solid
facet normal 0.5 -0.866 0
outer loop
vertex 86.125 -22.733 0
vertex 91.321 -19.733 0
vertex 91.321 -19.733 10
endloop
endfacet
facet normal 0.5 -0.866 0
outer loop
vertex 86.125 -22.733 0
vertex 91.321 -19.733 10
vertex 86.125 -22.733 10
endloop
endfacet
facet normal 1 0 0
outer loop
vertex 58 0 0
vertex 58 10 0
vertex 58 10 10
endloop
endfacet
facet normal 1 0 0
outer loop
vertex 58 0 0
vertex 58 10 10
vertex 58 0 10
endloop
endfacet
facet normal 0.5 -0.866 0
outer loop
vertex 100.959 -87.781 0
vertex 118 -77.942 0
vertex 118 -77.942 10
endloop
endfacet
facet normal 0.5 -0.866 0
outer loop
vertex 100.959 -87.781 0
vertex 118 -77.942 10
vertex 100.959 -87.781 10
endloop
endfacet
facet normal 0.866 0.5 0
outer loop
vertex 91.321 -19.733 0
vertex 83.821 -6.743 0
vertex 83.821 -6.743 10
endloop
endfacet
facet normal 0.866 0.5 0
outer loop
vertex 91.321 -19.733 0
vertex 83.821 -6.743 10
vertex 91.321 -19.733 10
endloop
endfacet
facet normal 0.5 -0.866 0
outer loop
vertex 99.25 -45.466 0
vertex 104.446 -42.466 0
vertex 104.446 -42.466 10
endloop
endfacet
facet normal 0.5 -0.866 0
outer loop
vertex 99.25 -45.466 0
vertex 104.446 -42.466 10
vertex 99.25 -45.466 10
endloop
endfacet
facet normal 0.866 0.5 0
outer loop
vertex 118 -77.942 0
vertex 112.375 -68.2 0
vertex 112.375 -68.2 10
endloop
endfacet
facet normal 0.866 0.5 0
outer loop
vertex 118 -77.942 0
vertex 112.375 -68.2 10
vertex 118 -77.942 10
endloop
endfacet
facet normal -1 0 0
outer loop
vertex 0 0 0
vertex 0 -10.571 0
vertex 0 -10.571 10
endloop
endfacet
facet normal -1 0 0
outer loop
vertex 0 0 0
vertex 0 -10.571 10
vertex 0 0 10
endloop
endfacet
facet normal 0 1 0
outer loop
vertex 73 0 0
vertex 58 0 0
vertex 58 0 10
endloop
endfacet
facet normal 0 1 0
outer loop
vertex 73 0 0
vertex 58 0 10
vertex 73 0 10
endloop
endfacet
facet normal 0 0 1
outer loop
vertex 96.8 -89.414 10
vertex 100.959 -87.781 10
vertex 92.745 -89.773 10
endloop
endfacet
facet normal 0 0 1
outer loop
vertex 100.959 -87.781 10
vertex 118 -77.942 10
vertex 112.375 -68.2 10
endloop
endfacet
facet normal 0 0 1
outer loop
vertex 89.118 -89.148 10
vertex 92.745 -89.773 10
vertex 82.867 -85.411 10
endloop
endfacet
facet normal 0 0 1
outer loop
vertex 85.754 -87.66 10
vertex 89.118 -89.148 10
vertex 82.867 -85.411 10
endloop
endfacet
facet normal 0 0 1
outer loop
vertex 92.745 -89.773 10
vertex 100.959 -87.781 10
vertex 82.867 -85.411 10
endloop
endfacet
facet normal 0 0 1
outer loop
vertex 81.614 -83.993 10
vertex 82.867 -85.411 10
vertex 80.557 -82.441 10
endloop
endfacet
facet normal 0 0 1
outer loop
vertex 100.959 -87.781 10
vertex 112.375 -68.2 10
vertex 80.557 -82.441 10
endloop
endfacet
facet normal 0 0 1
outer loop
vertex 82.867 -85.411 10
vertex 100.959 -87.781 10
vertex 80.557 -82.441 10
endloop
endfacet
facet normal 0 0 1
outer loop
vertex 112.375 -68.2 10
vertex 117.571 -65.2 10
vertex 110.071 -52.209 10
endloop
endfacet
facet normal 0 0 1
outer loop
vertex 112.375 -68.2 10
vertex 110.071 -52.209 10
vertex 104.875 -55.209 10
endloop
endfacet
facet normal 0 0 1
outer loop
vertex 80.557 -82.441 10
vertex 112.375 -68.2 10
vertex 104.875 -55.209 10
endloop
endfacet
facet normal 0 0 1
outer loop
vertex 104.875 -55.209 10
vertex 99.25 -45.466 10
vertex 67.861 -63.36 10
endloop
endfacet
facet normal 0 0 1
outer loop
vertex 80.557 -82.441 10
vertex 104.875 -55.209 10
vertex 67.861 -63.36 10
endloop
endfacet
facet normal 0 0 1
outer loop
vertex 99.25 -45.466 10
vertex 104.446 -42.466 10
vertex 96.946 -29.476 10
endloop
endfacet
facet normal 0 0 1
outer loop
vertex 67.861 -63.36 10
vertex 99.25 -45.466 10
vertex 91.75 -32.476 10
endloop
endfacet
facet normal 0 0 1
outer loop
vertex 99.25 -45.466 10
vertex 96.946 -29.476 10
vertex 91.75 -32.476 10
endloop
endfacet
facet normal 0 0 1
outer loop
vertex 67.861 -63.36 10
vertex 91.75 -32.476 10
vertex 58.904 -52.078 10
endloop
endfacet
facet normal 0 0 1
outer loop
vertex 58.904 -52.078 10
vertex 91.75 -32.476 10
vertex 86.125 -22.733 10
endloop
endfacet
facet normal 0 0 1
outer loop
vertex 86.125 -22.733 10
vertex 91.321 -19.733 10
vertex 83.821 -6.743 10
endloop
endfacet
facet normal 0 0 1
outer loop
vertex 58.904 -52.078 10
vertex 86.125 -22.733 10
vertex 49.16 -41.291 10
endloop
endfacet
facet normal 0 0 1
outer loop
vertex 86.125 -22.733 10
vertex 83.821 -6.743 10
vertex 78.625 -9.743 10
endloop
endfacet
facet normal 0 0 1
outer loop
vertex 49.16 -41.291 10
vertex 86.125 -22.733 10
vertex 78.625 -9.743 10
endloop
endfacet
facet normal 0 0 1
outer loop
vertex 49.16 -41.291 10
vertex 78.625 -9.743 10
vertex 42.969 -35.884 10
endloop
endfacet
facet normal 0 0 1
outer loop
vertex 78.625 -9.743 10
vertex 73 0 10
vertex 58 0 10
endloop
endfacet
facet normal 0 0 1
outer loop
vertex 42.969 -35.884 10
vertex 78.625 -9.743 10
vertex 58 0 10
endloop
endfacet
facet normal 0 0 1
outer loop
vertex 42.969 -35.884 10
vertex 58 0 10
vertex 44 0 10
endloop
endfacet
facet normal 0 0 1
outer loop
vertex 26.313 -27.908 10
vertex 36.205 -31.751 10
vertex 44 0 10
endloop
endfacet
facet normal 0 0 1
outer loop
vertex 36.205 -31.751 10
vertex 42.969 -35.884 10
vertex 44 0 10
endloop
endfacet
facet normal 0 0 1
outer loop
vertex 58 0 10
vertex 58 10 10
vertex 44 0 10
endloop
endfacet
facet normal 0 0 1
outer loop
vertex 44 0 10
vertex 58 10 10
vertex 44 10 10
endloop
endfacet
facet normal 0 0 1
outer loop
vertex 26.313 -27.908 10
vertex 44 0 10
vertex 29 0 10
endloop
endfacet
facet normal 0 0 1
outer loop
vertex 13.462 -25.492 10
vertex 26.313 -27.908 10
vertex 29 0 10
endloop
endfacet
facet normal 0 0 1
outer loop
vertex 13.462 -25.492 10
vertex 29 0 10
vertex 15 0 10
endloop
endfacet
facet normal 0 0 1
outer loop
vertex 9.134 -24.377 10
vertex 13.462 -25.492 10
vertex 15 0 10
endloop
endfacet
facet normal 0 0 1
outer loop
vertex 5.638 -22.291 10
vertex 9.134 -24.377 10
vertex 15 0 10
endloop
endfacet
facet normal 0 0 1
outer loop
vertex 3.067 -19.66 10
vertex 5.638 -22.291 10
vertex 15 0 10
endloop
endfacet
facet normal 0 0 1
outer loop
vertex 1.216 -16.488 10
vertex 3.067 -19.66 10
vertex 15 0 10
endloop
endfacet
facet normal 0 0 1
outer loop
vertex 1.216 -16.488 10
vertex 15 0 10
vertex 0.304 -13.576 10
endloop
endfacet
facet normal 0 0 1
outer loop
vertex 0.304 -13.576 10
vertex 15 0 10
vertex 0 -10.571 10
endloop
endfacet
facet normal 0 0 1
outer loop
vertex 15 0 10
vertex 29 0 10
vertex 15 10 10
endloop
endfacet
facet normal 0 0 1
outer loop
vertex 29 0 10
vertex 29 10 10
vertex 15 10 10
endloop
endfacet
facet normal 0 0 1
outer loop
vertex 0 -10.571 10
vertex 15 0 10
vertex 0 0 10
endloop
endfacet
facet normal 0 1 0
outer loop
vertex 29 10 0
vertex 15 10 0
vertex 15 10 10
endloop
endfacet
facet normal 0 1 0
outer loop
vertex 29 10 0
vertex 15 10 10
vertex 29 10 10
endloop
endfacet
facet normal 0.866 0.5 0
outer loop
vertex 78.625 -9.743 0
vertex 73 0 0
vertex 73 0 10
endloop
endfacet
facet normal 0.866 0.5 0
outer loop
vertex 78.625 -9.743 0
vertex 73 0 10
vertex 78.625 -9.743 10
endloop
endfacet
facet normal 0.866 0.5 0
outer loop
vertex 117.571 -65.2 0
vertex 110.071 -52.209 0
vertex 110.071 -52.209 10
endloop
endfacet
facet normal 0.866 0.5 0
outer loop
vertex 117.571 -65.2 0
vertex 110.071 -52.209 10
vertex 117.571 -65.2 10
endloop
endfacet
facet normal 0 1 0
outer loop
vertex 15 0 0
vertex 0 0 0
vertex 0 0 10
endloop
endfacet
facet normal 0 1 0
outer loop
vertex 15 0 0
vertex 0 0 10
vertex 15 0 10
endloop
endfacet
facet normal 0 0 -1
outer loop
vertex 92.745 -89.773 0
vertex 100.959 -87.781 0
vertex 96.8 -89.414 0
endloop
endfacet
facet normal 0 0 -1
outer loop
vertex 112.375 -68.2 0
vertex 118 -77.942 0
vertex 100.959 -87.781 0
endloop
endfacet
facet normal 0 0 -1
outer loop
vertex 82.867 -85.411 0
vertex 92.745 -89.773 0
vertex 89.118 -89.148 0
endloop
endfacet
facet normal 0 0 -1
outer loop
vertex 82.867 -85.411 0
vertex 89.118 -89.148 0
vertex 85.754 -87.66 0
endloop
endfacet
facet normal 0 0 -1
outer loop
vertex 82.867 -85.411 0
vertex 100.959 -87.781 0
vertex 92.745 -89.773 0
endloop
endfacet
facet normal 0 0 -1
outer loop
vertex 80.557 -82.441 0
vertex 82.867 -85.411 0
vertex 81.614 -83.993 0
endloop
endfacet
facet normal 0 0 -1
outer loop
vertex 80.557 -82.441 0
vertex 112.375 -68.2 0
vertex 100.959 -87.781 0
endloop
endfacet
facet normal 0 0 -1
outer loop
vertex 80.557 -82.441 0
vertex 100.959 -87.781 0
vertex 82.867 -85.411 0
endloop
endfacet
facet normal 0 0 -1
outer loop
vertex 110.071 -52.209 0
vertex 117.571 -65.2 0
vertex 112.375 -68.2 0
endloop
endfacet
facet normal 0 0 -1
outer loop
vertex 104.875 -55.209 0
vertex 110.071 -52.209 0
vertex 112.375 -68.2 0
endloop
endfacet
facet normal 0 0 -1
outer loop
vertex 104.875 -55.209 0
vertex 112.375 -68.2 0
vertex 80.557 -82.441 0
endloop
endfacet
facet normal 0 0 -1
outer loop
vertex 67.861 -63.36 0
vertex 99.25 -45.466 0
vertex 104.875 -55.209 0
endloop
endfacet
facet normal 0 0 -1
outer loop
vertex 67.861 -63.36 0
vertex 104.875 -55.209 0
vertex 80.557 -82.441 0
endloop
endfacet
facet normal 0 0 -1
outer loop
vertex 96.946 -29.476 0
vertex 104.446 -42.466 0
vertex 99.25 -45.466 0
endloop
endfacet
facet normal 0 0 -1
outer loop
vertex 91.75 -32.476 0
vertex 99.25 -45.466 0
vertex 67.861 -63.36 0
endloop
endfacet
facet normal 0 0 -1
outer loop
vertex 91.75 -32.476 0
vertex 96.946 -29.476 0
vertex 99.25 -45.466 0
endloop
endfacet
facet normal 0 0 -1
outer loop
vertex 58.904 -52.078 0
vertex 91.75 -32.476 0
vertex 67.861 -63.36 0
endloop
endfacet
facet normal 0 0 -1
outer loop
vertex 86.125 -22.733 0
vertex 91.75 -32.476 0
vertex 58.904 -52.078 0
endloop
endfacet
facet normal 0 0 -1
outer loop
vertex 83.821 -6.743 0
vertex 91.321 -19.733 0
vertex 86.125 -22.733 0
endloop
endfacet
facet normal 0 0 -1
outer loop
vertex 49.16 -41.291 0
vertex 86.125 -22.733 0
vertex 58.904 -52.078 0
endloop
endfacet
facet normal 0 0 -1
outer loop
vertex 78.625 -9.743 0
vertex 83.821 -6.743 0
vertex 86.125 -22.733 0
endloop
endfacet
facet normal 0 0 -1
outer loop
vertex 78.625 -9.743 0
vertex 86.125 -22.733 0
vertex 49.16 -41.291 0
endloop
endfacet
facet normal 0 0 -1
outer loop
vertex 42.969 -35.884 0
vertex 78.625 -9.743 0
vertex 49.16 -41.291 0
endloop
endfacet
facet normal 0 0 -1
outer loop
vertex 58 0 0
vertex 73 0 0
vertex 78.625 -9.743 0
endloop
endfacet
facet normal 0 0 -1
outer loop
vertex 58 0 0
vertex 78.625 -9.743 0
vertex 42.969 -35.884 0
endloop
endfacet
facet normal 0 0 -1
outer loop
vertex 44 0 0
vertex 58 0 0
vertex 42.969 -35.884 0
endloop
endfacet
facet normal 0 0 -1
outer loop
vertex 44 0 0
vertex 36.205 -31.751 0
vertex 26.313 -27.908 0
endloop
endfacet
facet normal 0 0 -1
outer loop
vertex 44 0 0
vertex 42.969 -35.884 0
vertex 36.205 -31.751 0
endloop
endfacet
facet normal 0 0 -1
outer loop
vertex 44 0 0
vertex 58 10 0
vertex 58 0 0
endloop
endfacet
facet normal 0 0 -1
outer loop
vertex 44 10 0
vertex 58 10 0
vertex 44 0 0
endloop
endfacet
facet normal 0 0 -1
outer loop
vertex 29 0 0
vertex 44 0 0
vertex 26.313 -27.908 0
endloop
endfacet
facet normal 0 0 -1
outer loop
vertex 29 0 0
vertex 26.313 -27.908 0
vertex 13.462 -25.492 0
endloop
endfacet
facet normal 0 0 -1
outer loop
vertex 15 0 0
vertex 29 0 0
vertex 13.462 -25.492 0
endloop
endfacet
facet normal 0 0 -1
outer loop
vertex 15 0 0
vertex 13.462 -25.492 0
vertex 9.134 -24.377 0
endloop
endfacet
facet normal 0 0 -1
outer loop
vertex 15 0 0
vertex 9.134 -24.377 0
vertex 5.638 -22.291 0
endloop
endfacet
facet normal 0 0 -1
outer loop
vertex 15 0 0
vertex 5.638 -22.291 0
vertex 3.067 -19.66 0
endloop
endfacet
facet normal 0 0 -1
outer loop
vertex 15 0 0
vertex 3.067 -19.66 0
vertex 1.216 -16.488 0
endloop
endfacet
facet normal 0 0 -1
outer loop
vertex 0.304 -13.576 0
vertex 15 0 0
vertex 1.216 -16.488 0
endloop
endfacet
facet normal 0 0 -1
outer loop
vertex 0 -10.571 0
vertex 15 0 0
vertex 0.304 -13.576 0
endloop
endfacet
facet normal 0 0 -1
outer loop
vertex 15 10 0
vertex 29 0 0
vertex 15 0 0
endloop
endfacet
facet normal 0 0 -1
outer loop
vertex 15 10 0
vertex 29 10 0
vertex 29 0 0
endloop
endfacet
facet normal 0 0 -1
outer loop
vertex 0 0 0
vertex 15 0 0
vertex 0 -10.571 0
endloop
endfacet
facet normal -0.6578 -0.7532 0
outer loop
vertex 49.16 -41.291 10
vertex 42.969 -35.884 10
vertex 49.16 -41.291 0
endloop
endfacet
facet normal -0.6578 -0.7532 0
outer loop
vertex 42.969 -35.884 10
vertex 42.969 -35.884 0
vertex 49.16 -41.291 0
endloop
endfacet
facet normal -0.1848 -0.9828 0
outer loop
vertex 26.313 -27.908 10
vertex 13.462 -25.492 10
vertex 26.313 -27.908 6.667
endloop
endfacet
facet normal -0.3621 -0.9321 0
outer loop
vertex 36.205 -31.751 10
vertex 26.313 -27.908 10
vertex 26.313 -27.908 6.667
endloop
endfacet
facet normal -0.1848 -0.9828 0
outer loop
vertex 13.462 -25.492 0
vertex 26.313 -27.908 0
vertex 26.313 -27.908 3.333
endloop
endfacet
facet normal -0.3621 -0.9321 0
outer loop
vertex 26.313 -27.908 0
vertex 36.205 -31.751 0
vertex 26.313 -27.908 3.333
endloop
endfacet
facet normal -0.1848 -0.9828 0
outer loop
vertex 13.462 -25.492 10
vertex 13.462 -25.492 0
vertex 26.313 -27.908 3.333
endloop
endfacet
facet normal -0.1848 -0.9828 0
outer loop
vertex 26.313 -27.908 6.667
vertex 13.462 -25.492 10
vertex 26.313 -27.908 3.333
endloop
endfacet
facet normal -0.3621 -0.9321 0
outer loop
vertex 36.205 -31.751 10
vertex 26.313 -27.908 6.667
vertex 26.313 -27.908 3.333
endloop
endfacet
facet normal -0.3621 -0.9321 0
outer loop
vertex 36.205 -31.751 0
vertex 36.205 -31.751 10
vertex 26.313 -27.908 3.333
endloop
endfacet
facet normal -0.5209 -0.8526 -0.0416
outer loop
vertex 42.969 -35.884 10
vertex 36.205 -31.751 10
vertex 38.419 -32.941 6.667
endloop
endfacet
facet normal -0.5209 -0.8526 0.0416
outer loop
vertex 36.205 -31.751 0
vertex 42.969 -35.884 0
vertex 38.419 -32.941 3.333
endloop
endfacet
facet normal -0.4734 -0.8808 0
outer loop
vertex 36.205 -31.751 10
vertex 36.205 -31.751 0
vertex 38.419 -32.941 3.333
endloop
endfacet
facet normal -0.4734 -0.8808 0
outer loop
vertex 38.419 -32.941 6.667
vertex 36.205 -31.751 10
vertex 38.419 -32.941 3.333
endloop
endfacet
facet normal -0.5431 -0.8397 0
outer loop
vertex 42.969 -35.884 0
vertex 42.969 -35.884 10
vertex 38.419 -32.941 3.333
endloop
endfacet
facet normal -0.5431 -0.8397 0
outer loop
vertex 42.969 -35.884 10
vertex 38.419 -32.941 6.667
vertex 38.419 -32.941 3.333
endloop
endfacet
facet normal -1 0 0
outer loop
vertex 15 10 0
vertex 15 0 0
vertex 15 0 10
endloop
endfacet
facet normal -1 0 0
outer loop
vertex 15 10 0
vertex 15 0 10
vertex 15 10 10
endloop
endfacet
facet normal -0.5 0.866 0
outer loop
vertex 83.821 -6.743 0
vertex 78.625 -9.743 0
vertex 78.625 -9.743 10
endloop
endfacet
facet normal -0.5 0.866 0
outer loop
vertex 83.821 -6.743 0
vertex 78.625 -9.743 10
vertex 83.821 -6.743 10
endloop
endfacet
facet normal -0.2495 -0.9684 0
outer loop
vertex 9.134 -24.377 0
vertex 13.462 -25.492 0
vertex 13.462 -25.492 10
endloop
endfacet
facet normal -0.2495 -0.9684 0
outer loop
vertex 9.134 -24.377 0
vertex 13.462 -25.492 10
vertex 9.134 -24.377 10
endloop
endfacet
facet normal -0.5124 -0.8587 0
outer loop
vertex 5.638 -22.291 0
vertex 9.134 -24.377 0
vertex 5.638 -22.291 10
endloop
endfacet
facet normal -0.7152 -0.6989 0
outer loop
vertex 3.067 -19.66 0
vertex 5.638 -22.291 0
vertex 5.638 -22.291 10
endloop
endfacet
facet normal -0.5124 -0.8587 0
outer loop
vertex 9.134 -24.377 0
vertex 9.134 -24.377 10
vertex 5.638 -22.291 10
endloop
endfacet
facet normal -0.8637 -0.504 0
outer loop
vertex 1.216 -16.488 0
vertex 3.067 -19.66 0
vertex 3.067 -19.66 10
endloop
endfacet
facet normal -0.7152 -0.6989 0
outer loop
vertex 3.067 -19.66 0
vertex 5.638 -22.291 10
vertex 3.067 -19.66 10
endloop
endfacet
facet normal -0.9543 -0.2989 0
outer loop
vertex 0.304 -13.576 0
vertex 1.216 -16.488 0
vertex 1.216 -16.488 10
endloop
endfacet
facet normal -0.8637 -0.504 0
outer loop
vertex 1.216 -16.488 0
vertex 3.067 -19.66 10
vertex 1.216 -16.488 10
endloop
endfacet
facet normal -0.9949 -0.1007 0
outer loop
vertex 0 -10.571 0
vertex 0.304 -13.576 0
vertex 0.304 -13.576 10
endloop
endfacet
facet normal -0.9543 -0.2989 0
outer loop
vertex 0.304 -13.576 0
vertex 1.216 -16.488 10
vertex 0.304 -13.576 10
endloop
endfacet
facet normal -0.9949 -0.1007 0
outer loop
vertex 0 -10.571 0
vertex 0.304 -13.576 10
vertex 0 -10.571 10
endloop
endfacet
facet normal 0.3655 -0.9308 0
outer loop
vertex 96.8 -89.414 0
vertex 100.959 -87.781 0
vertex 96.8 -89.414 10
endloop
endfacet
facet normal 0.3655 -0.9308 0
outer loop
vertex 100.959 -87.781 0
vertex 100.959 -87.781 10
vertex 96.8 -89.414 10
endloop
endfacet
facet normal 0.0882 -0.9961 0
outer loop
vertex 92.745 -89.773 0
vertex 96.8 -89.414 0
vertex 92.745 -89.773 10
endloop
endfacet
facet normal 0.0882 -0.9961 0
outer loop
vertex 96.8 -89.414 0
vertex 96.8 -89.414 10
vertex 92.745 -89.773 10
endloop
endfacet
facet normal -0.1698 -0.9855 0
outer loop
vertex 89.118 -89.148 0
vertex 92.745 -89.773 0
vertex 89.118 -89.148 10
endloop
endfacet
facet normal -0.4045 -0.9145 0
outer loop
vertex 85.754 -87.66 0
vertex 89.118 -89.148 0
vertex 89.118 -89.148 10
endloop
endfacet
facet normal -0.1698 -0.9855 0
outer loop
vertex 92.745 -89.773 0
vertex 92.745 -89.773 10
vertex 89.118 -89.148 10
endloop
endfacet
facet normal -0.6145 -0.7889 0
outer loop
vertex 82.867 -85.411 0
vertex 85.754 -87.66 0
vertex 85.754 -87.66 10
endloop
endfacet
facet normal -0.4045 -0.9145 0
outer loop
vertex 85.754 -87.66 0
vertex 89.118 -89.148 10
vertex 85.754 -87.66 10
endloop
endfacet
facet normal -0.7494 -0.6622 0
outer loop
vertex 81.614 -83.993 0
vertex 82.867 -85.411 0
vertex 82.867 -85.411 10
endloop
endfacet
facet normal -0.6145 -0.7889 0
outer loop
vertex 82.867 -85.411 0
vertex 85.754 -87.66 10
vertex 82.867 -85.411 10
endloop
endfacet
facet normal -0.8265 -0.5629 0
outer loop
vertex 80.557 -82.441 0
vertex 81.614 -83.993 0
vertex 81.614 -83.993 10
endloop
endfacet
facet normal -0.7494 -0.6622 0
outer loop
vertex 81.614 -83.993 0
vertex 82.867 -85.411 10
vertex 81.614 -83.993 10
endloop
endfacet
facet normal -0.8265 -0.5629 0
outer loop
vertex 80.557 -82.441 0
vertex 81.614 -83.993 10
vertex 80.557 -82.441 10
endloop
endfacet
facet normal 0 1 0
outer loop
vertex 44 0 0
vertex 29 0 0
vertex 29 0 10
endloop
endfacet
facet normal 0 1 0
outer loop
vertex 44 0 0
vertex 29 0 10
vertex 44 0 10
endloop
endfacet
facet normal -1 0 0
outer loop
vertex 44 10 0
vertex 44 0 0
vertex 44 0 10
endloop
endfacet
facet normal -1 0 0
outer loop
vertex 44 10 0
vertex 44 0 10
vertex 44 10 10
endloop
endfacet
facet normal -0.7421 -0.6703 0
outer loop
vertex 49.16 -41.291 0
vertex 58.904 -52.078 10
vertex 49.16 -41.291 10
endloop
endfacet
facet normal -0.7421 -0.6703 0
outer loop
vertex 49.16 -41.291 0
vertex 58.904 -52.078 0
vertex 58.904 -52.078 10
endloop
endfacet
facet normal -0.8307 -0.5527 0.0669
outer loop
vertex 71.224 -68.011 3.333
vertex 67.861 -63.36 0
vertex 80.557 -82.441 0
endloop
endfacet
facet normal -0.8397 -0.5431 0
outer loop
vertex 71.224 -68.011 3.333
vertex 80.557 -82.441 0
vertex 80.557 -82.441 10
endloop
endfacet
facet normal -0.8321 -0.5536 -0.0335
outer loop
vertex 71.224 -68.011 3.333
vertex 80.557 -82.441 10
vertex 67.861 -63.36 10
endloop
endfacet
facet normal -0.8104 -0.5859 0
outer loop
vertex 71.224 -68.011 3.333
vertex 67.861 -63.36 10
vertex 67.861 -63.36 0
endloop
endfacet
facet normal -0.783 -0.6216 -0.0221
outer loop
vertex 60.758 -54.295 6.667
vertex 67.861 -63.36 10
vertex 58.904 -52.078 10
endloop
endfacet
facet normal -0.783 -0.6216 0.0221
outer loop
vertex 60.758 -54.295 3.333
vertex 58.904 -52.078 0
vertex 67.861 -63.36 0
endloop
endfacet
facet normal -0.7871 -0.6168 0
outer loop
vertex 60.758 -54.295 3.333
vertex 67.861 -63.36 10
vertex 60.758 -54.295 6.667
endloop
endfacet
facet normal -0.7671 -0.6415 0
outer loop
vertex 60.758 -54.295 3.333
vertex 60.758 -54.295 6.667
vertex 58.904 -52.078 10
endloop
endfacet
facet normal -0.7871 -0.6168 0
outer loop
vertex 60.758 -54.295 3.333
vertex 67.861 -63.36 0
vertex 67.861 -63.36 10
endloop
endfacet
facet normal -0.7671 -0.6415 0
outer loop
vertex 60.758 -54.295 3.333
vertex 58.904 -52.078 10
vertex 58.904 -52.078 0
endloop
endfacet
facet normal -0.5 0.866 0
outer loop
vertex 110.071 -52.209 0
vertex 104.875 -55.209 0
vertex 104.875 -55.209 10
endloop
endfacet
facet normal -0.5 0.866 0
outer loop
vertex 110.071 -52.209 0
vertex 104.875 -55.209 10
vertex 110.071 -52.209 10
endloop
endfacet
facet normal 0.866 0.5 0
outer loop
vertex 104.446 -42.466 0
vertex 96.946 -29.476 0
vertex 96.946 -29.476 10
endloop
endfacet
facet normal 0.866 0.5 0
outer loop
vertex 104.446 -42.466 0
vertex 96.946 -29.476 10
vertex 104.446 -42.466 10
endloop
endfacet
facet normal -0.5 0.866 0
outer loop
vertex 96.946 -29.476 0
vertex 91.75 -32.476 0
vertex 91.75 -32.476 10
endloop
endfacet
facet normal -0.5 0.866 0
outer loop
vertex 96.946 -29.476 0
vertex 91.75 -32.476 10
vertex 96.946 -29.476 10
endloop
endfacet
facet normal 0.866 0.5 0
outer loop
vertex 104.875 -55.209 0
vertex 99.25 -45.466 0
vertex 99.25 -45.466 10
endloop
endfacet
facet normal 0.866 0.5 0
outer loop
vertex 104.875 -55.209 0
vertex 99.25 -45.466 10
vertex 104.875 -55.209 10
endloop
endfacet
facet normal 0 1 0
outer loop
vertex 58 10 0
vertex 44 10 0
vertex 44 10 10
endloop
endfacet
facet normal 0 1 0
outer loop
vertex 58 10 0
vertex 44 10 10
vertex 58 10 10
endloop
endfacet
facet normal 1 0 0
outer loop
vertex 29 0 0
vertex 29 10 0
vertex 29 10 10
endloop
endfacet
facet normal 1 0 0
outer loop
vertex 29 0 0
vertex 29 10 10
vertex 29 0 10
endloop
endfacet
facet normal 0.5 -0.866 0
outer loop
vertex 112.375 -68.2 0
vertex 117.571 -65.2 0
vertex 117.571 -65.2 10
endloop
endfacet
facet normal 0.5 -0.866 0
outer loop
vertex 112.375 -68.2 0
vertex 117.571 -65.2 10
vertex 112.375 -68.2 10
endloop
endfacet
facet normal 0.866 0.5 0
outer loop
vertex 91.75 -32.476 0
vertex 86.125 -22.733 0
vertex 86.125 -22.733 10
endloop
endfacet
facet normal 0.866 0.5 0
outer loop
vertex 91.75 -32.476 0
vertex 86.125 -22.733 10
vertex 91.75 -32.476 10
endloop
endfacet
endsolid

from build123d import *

# Parameters (mm, degrees)
BOSS_EXTRUDE1_DEPTH = 10
FILLET1_R           = 15


with BuildPart() as part:
    # Sketch1 → Boss-Extrude1 (new body)
    with BuildSketch(Plane.XY):
        with BuildLine():
            Line((0, 0), (15, 0))
            Line((15, 0), (15, 10))
            Line((15, 10), (29, 10))
            Line((29, 10), (29, 0))
            Line((29, 0), (44, 0))
            Line((44, 0), (44, 10))
            Line((44, 10), (58, 10))
            Line((58, 10), (58, 0))
            Line((58, 0), (73, 0))
            Line((73, 0), (78.625, -9.742785793))
            Line((78.625, -9.742785793), (83.821152423, -6.742785793))
            Line((83.821152423, -6.742785793), (91.321152423, -19.733166849))
            Line((91.321152423, -19.733166849), (86.125, -22.733166849))
            Line((86.125, -22.733166849), (91.75, -32.475952642))
            Line((91.75, -32.475952642), (96.946152423, -29.475952642))
            Line((96.946152423, -29.475952642), (104.446152423, -42.466333699))
            Line((104.446152423, -42.466333699), (99.25, -45.466333699))
            Line((99.25, -45.466333699), (104.875, -55.209119491))
            Line((104.875, -55.209119491), (110.071152423, -52.209119491))
            Line((110.071152423, -52.209119491), (117.571152423, -65.199500548))
            Line((117.571152423, -65.199500548), (112.375, -68.199500548))
            Line((112.375, -68.199500548), (118, -77.942286341))
            Line((118, -77.942286341), (87.689110868, -95.442286341))
            add(Edge.make_bspline(
                [(87.689110868, -95.442286341), (77.660181341, -75.620017272), (64.817303381, -57.569676854), (49.160476986, -41.291265088)],
                knots=[0, 0, 0, 0, 1, 1, 1, 1], degree=3))
            add(Edge.make_bspline(
                [(0, -25), (17.242534467, -24.639573707), (35.899987596, -27.504326339), (49.160476986, -41.291265088)],
                knots=[0, 0, 0, 0, 1, 1, 1, 1], degree=3))
            Line((0, -25), (0, 0))
        make_face()
    extrude(amount=BOSS_EXTRUDE1_DEPTH)

    # Fillet1
    fillet1_edges = [part.edges().sort_by_distance(p)[0] for p in [
        (87.689110868, -95.442286341, 5),
        (0, -25, 5),
    ]]
    fillet(fillet1_edges, radius=FILLET1_R)


solid = part.part
